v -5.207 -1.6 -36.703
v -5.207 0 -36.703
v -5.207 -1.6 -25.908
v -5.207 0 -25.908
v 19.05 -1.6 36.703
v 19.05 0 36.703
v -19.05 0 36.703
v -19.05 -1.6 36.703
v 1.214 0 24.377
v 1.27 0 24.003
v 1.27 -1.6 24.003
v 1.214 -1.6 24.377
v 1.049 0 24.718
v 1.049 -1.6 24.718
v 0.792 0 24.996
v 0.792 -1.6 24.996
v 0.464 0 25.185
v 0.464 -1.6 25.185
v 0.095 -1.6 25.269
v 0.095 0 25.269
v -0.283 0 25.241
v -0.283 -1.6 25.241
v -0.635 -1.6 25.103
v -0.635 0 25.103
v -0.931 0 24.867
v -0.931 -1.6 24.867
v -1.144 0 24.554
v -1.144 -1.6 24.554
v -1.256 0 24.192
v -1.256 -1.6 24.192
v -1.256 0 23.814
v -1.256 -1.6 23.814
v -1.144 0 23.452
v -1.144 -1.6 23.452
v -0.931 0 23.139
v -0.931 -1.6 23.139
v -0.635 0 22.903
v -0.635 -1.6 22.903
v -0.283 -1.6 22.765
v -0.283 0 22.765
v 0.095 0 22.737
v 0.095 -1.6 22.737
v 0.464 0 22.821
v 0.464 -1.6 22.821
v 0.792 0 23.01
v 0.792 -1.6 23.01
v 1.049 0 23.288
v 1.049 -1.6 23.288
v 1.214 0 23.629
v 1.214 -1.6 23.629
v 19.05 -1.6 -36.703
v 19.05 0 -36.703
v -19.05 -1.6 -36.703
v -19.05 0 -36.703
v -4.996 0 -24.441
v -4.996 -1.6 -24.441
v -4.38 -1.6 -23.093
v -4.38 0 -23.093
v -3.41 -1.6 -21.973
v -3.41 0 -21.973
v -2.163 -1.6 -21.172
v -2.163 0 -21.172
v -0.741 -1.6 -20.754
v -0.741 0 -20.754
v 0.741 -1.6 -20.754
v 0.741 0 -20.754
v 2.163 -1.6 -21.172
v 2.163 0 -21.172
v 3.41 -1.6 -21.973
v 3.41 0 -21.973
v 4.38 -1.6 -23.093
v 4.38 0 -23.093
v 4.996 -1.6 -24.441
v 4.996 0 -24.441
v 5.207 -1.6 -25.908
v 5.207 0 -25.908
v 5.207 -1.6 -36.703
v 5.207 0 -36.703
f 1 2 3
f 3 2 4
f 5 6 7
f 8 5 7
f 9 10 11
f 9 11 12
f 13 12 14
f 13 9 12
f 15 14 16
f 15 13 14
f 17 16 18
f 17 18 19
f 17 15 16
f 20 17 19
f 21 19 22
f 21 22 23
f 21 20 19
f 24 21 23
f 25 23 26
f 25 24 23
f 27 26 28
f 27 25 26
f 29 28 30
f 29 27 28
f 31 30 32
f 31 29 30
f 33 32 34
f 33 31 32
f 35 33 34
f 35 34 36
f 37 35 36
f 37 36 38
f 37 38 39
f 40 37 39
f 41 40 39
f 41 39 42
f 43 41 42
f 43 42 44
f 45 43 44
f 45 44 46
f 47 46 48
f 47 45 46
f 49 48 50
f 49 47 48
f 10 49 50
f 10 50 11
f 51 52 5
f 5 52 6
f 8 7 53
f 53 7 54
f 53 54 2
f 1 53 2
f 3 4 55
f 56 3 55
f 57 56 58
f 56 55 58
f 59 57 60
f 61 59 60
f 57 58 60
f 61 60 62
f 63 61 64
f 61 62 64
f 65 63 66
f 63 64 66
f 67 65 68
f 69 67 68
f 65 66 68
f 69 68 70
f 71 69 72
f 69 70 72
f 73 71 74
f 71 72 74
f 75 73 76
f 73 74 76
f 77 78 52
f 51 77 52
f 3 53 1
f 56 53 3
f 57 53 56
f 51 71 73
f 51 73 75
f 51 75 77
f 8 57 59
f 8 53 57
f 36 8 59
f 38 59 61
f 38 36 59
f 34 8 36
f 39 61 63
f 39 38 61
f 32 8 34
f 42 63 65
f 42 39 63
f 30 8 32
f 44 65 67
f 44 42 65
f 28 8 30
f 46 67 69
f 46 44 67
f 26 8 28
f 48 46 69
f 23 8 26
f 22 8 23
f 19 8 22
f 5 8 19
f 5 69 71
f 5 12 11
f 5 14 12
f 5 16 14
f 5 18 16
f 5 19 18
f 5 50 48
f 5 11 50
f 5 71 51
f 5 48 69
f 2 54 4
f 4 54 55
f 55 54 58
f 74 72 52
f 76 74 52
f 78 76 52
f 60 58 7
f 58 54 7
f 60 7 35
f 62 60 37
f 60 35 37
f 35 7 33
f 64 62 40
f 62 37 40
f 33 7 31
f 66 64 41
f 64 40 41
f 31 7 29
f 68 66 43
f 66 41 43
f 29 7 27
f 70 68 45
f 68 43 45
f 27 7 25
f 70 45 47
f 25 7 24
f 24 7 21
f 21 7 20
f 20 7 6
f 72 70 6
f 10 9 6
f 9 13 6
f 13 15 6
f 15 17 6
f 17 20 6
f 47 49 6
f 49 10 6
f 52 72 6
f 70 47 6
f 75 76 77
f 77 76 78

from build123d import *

# Parameters (mm, degrees)
F0_R     = 1.27
F1_DEPTH = 1.6002


with BuildPart() as f1:
    # F0 (on Front) → F1 (new body)
    with BuildSketch(Plane.XZ):
        with BuildLine():
            Line((5.207, -36.703), (19.05, -36.703))
            Line((19.05, -36.703), (19.05, 36.703))
            Line((19.05, 36.703), (-19.05, 36.703))
            Line((-19.05, 36.703), (-19.05, -36.703))
            Line((-19.05, -36.703), (-5.207, -36.703))
            Line((-5.207, -36.703), (-5.207, -25.908))
            ThreePointArc((-5.207, -25.908), (0, -20.701), (5.207, -25.908))
            Line((5.207, -25.908), (5.207, -36.703))
        make_face()
        with Locations((0, 24.003)):
            Circle(F0_R, mode=Mode.SUBTRACT)
    extrude(amount=F1_DEPTH)


solid = f1.part
